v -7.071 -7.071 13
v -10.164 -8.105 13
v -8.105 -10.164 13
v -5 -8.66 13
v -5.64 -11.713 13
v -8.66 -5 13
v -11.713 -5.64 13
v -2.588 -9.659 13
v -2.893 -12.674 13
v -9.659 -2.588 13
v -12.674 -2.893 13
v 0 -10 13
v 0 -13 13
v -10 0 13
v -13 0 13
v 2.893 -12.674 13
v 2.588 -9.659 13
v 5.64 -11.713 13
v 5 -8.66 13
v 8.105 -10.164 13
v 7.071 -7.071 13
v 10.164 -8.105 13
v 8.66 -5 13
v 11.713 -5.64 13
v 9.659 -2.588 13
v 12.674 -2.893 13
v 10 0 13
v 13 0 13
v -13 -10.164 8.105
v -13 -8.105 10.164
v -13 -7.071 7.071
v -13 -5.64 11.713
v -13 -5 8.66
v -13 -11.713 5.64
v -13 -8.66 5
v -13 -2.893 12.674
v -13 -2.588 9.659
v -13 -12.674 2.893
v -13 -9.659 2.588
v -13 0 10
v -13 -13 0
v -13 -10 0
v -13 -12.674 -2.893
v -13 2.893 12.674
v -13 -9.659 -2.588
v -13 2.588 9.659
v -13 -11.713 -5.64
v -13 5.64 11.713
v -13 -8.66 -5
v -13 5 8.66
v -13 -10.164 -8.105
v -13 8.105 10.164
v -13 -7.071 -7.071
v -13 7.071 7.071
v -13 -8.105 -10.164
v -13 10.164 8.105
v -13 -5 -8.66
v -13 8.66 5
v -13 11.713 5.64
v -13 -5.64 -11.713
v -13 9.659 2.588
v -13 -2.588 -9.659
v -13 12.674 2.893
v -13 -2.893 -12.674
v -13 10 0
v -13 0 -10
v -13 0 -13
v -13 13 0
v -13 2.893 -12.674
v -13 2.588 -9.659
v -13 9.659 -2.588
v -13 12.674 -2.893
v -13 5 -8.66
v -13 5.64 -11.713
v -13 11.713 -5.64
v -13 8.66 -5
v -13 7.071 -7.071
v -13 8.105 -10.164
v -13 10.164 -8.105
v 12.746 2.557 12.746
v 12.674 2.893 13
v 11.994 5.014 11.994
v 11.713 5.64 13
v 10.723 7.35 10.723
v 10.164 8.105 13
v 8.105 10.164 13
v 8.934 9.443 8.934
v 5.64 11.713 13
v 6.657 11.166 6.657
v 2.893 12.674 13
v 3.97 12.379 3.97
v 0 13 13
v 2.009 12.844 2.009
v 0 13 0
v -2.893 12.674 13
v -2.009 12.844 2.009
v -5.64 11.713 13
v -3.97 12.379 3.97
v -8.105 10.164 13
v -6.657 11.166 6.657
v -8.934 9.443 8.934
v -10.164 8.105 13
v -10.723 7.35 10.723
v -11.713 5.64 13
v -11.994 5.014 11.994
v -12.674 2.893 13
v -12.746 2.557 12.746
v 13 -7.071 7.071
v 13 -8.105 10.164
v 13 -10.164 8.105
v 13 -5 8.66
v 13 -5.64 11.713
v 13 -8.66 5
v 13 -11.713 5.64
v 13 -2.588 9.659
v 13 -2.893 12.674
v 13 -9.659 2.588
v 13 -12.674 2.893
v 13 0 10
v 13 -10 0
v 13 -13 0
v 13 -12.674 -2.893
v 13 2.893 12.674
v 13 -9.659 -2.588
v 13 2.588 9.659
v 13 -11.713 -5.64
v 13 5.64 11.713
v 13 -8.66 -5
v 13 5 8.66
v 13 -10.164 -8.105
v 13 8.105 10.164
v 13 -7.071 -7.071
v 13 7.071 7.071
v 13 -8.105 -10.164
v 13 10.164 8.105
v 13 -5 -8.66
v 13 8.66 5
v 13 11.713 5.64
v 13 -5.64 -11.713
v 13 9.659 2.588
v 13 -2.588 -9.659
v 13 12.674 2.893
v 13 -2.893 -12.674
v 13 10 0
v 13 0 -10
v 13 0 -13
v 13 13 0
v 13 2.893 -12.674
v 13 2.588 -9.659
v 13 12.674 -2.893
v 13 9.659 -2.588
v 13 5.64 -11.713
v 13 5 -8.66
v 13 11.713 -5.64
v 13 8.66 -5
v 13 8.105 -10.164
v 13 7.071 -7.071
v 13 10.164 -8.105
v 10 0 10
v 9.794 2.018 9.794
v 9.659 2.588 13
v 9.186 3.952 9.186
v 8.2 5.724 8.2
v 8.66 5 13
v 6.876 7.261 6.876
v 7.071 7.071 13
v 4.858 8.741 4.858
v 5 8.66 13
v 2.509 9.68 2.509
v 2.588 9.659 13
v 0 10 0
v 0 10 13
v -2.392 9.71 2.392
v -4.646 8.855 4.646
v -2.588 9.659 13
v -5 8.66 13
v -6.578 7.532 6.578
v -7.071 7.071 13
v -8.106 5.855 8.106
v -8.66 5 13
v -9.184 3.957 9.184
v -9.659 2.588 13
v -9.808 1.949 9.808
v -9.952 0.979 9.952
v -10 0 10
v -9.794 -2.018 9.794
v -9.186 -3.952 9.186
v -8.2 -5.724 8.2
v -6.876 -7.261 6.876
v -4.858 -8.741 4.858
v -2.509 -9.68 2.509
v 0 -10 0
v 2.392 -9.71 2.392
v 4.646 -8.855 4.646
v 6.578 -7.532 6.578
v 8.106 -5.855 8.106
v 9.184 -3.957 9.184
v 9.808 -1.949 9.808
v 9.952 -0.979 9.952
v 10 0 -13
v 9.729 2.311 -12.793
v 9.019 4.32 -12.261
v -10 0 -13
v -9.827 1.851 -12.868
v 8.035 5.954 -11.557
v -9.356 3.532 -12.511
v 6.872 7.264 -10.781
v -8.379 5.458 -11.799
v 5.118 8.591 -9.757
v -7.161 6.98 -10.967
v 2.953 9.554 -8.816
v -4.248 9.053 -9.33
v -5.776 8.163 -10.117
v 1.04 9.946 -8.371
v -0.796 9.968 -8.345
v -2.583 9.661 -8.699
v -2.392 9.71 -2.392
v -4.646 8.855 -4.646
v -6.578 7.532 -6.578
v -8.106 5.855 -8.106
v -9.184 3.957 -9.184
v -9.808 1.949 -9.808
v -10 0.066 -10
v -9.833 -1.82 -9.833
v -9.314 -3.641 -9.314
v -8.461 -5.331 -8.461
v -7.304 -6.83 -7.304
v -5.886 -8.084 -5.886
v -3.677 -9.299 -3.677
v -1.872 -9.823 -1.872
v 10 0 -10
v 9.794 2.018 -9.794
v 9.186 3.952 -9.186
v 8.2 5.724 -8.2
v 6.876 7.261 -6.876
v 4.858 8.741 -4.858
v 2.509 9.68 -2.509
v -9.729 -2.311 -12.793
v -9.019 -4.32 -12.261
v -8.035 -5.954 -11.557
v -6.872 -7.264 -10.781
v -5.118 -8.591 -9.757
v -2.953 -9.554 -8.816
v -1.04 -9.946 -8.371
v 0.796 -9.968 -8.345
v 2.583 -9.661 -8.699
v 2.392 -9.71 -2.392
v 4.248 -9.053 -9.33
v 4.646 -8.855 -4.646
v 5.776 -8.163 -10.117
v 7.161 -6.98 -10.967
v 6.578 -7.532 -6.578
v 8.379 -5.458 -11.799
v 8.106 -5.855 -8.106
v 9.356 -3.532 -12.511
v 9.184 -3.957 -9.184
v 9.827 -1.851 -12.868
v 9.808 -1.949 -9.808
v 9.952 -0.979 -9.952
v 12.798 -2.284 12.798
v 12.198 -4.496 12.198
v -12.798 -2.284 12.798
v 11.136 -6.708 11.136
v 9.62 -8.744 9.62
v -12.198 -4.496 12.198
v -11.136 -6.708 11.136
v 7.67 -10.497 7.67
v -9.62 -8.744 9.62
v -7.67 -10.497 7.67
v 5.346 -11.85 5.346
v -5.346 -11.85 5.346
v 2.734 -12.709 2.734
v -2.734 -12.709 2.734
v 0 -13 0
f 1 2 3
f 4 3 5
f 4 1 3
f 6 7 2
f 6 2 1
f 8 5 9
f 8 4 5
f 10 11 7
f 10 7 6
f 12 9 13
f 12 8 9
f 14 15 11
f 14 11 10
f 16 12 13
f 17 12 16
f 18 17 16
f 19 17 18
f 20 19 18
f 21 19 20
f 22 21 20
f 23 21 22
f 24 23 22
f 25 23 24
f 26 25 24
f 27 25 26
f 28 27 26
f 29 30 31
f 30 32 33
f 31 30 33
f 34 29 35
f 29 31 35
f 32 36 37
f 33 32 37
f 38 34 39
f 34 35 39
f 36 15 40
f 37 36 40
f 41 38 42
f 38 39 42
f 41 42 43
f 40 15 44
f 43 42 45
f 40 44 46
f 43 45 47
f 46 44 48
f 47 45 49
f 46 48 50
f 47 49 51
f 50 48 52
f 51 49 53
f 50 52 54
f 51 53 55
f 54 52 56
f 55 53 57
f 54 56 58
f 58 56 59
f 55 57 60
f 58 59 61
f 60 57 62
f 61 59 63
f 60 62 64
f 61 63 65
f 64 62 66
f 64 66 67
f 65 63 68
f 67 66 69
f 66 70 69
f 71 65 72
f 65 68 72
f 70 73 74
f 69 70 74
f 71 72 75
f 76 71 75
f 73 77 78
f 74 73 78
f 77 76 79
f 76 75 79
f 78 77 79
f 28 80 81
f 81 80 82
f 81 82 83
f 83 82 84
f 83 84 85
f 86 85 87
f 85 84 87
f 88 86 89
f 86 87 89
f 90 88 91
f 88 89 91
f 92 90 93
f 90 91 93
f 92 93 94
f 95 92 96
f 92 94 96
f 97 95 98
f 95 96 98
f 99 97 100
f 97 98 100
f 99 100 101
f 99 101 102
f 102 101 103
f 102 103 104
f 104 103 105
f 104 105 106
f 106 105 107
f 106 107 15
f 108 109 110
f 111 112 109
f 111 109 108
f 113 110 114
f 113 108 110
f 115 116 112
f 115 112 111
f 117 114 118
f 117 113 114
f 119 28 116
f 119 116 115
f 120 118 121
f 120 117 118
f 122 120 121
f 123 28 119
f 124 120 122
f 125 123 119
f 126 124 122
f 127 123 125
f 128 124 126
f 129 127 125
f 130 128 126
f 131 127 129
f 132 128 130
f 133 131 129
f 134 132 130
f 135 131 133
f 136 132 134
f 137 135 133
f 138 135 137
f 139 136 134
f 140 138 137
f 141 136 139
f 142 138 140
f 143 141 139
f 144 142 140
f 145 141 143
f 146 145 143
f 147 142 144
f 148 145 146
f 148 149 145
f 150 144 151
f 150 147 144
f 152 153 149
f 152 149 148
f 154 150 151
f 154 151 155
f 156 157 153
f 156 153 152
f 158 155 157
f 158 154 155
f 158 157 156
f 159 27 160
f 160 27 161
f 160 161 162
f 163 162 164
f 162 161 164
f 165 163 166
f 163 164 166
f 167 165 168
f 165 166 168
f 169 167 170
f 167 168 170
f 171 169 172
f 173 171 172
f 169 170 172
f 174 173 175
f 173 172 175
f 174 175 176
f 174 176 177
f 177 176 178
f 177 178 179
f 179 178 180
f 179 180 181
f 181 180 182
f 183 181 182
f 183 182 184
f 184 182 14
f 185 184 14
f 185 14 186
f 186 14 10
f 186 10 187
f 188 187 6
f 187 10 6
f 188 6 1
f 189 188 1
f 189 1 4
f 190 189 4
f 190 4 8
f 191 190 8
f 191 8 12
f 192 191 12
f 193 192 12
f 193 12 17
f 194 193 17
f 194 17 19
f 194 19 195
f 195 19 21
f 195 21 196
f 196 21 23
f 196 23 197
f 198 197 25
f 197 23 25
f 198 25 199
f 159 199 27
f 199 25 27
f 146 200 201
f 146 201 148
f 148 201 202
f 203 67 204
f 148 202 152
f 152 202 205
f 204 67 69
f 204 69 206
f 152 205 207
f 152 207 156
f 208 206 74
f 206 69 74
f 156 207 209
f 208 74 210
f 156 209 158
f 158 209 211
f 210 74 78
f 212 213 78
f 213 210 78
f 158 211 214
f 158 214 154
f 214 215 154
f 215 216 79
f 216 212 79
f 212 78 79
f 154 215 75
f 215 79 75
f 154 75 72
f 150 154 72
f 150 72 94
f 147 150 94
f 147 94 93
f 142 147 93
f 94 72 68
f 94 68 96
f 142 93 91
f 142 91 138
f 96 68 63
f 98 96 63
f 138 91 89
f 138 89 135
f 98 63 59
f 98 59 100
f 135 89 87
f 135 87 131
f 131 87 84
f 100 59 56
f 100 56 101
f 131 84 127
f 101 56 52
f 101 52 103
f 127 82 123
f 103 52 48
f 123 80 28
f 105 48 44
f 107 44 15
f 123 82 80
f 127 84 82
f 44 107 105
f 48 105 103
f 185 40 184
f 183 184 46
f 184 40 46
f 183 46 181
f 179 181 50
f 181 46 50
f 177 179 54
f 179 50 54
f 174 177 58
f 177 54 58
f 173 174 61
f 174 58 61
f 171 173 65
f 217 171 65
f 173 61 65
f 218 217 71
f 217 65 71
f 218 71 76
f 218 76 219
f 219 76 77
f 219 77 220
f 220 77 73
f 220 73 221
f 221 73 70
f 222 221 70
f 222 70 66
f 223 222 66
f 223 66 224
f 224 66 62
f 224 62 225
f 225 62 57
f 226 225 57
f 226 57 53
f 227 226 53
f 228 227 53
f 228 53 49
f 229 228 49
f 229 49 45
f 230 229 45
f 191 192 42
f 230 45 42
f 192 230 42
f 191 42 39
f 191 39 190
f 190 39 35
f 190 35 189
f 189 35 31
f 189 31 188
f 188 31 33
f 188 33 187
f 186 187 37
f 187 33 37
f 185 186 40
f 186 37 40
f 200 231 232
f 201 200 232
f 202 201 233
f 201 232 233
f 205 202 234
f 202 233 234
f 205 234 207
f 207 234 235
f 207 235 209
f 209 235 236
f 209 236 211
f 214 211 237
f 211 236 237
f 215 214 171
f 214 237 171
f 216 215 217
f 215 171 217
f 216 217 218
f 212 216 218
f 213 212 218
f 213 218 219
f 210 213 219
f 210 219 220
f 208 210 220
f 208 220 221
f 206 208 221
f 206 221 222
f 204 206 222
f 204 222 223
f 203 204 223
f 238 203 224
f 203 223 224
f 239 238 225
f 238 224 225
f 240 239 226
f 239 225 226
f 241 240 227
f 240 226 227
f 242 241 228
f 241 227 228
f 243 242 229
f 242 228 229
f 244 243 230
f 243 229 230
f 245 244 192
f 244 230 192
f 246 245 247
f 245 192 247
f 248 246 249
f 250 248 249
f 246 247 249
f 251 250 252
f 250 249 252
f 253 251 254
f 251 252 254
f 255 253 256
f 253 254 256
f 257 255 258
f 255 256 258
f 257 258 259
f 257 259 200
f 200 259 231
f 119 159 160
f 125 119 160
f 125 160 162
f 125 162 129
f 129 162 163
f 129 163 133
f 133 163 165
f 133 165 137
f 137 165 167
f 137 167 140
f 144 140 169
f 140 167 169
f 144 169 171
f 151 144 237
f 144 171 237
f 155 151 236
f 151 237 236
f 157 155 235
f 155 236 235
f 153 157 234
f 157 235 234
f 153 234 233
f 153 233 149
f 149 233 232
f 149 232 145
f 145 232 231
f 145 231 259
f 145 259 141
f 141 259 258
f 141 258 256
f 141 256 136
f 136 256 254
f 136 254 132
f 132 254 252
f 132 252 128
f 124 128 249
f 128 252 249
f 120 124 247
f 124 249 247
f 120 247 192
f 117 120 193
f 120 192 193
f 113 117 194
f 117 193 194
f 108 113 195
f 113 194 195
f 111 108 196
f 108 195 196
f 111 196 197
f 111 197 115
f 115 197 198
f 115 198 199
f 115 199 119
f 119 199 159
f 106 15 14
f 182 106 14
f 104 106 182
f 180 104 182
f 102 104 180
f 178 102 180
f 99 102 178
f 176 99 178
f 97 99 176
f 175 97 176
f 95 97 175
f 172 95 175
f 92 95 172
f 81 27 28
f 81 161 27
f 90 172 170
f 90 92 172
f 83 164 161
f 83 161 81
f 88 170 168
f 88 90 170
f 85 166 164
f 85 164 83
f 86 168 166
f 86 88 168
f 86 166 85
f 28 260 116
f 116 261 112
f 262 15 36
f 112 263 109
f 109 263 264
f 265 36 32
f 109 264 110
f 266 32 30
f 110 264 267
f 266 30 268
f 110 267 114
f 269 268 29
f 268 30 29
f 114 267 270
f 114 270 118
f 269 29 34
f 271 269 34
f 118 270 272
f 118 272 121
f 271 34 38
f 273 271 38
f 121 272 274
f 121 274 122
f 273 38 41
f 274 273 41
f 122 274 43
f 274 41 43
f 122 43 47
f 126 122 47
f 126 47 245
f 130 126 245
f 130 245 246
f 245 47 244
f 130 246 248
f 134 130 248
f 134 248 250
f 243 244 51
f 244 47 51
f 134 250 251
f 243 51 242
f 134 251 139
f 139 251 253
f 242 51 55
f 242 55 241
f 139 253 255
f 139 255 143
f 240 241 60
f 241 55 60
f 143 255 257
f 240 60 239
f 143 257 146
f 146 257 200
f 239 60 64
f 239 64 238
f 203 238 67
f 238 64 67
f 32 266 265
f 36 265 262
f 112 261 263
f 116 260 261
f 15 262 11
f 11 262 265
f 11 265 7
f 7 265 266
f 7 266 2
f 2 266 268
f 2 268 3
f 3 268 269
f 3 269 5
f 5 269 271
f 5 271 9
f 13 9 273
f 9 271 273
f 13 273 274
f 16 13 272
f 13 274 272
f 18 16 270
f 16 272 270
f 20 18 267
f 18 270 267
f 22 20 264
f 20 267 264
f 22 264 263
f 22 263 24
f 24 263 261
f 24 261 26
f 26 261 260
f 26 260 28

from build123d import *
from build123d.topology import SkipClean

# Parameters (mm, degrees)
BOSS_EXTRUDE4_DEPTH      = 13
BOSS_EXTRUDE4_DEPTH_BACK = 13
SKETCH46_R               = 13
SKETCH47_R               = 13
BOSS_EXTRUDE5_DEPTH      = 13
SKETCH48_R               = 10
CUT_EXTRUDE1_DEPTH       = 33
SKETCH49_R               = 10
CUT_EXTRUDE2_DEPTH       = 33


with BuildPart() as part:
    # Sketch46 → Boss-Extrude4 (new, two sides: drawn at the far end of the back side and taken through both)
    with BuildSketch(Plane(origin=(0, 0, 0), x_dir=(0, 0, -1), z_dir=(1, 0, 0)).offset(-BOSS_EXTRUDE4_DEPTH_BACK)):
        Circle(SKETCH46_R)
    extrude(amount=BOSS_EXTRUDE4_DEPTH + BOSS_EXTRUDE4_DEPTH_BACK)

    # Sketch47 → Boss-Extrude5 (add)
    with SkipClean():  # the faces are left unmerged after this step: merging them gives an invalid solid
        with BuildSketch(Plane.XY):
            Circle(SKETCH47_R)
        extrude(amount=BOSS_EXTRUDE5_DEPTH)

    # Sketch48 → Cut-Extrude1 (cut)
    with SkipClean():  # the faces are left unmerged after this step: merging them gives an invalid solid
        with BuildSketch(Plane.XY.offset(13)):
            Circle(SKETCH48_R)
        extrude(amount=-CUT_EXTRUDE1_DEPTH, mode=Mode.SUBTRACT)

    # Sketch49 → Cut-Extrude2 (cut)
    with SkipClean():  # the faces are left unmerged after this step: merging them gives an invalid solid
        with BuildSketch(Plane.ZY.offset(13)):
            Circle(SKETCH49_R)
        extrude(amount=-CUT_EXTRUDE2_DEPTH, mode=Mode.SUBTRACT)


solid = part.part
